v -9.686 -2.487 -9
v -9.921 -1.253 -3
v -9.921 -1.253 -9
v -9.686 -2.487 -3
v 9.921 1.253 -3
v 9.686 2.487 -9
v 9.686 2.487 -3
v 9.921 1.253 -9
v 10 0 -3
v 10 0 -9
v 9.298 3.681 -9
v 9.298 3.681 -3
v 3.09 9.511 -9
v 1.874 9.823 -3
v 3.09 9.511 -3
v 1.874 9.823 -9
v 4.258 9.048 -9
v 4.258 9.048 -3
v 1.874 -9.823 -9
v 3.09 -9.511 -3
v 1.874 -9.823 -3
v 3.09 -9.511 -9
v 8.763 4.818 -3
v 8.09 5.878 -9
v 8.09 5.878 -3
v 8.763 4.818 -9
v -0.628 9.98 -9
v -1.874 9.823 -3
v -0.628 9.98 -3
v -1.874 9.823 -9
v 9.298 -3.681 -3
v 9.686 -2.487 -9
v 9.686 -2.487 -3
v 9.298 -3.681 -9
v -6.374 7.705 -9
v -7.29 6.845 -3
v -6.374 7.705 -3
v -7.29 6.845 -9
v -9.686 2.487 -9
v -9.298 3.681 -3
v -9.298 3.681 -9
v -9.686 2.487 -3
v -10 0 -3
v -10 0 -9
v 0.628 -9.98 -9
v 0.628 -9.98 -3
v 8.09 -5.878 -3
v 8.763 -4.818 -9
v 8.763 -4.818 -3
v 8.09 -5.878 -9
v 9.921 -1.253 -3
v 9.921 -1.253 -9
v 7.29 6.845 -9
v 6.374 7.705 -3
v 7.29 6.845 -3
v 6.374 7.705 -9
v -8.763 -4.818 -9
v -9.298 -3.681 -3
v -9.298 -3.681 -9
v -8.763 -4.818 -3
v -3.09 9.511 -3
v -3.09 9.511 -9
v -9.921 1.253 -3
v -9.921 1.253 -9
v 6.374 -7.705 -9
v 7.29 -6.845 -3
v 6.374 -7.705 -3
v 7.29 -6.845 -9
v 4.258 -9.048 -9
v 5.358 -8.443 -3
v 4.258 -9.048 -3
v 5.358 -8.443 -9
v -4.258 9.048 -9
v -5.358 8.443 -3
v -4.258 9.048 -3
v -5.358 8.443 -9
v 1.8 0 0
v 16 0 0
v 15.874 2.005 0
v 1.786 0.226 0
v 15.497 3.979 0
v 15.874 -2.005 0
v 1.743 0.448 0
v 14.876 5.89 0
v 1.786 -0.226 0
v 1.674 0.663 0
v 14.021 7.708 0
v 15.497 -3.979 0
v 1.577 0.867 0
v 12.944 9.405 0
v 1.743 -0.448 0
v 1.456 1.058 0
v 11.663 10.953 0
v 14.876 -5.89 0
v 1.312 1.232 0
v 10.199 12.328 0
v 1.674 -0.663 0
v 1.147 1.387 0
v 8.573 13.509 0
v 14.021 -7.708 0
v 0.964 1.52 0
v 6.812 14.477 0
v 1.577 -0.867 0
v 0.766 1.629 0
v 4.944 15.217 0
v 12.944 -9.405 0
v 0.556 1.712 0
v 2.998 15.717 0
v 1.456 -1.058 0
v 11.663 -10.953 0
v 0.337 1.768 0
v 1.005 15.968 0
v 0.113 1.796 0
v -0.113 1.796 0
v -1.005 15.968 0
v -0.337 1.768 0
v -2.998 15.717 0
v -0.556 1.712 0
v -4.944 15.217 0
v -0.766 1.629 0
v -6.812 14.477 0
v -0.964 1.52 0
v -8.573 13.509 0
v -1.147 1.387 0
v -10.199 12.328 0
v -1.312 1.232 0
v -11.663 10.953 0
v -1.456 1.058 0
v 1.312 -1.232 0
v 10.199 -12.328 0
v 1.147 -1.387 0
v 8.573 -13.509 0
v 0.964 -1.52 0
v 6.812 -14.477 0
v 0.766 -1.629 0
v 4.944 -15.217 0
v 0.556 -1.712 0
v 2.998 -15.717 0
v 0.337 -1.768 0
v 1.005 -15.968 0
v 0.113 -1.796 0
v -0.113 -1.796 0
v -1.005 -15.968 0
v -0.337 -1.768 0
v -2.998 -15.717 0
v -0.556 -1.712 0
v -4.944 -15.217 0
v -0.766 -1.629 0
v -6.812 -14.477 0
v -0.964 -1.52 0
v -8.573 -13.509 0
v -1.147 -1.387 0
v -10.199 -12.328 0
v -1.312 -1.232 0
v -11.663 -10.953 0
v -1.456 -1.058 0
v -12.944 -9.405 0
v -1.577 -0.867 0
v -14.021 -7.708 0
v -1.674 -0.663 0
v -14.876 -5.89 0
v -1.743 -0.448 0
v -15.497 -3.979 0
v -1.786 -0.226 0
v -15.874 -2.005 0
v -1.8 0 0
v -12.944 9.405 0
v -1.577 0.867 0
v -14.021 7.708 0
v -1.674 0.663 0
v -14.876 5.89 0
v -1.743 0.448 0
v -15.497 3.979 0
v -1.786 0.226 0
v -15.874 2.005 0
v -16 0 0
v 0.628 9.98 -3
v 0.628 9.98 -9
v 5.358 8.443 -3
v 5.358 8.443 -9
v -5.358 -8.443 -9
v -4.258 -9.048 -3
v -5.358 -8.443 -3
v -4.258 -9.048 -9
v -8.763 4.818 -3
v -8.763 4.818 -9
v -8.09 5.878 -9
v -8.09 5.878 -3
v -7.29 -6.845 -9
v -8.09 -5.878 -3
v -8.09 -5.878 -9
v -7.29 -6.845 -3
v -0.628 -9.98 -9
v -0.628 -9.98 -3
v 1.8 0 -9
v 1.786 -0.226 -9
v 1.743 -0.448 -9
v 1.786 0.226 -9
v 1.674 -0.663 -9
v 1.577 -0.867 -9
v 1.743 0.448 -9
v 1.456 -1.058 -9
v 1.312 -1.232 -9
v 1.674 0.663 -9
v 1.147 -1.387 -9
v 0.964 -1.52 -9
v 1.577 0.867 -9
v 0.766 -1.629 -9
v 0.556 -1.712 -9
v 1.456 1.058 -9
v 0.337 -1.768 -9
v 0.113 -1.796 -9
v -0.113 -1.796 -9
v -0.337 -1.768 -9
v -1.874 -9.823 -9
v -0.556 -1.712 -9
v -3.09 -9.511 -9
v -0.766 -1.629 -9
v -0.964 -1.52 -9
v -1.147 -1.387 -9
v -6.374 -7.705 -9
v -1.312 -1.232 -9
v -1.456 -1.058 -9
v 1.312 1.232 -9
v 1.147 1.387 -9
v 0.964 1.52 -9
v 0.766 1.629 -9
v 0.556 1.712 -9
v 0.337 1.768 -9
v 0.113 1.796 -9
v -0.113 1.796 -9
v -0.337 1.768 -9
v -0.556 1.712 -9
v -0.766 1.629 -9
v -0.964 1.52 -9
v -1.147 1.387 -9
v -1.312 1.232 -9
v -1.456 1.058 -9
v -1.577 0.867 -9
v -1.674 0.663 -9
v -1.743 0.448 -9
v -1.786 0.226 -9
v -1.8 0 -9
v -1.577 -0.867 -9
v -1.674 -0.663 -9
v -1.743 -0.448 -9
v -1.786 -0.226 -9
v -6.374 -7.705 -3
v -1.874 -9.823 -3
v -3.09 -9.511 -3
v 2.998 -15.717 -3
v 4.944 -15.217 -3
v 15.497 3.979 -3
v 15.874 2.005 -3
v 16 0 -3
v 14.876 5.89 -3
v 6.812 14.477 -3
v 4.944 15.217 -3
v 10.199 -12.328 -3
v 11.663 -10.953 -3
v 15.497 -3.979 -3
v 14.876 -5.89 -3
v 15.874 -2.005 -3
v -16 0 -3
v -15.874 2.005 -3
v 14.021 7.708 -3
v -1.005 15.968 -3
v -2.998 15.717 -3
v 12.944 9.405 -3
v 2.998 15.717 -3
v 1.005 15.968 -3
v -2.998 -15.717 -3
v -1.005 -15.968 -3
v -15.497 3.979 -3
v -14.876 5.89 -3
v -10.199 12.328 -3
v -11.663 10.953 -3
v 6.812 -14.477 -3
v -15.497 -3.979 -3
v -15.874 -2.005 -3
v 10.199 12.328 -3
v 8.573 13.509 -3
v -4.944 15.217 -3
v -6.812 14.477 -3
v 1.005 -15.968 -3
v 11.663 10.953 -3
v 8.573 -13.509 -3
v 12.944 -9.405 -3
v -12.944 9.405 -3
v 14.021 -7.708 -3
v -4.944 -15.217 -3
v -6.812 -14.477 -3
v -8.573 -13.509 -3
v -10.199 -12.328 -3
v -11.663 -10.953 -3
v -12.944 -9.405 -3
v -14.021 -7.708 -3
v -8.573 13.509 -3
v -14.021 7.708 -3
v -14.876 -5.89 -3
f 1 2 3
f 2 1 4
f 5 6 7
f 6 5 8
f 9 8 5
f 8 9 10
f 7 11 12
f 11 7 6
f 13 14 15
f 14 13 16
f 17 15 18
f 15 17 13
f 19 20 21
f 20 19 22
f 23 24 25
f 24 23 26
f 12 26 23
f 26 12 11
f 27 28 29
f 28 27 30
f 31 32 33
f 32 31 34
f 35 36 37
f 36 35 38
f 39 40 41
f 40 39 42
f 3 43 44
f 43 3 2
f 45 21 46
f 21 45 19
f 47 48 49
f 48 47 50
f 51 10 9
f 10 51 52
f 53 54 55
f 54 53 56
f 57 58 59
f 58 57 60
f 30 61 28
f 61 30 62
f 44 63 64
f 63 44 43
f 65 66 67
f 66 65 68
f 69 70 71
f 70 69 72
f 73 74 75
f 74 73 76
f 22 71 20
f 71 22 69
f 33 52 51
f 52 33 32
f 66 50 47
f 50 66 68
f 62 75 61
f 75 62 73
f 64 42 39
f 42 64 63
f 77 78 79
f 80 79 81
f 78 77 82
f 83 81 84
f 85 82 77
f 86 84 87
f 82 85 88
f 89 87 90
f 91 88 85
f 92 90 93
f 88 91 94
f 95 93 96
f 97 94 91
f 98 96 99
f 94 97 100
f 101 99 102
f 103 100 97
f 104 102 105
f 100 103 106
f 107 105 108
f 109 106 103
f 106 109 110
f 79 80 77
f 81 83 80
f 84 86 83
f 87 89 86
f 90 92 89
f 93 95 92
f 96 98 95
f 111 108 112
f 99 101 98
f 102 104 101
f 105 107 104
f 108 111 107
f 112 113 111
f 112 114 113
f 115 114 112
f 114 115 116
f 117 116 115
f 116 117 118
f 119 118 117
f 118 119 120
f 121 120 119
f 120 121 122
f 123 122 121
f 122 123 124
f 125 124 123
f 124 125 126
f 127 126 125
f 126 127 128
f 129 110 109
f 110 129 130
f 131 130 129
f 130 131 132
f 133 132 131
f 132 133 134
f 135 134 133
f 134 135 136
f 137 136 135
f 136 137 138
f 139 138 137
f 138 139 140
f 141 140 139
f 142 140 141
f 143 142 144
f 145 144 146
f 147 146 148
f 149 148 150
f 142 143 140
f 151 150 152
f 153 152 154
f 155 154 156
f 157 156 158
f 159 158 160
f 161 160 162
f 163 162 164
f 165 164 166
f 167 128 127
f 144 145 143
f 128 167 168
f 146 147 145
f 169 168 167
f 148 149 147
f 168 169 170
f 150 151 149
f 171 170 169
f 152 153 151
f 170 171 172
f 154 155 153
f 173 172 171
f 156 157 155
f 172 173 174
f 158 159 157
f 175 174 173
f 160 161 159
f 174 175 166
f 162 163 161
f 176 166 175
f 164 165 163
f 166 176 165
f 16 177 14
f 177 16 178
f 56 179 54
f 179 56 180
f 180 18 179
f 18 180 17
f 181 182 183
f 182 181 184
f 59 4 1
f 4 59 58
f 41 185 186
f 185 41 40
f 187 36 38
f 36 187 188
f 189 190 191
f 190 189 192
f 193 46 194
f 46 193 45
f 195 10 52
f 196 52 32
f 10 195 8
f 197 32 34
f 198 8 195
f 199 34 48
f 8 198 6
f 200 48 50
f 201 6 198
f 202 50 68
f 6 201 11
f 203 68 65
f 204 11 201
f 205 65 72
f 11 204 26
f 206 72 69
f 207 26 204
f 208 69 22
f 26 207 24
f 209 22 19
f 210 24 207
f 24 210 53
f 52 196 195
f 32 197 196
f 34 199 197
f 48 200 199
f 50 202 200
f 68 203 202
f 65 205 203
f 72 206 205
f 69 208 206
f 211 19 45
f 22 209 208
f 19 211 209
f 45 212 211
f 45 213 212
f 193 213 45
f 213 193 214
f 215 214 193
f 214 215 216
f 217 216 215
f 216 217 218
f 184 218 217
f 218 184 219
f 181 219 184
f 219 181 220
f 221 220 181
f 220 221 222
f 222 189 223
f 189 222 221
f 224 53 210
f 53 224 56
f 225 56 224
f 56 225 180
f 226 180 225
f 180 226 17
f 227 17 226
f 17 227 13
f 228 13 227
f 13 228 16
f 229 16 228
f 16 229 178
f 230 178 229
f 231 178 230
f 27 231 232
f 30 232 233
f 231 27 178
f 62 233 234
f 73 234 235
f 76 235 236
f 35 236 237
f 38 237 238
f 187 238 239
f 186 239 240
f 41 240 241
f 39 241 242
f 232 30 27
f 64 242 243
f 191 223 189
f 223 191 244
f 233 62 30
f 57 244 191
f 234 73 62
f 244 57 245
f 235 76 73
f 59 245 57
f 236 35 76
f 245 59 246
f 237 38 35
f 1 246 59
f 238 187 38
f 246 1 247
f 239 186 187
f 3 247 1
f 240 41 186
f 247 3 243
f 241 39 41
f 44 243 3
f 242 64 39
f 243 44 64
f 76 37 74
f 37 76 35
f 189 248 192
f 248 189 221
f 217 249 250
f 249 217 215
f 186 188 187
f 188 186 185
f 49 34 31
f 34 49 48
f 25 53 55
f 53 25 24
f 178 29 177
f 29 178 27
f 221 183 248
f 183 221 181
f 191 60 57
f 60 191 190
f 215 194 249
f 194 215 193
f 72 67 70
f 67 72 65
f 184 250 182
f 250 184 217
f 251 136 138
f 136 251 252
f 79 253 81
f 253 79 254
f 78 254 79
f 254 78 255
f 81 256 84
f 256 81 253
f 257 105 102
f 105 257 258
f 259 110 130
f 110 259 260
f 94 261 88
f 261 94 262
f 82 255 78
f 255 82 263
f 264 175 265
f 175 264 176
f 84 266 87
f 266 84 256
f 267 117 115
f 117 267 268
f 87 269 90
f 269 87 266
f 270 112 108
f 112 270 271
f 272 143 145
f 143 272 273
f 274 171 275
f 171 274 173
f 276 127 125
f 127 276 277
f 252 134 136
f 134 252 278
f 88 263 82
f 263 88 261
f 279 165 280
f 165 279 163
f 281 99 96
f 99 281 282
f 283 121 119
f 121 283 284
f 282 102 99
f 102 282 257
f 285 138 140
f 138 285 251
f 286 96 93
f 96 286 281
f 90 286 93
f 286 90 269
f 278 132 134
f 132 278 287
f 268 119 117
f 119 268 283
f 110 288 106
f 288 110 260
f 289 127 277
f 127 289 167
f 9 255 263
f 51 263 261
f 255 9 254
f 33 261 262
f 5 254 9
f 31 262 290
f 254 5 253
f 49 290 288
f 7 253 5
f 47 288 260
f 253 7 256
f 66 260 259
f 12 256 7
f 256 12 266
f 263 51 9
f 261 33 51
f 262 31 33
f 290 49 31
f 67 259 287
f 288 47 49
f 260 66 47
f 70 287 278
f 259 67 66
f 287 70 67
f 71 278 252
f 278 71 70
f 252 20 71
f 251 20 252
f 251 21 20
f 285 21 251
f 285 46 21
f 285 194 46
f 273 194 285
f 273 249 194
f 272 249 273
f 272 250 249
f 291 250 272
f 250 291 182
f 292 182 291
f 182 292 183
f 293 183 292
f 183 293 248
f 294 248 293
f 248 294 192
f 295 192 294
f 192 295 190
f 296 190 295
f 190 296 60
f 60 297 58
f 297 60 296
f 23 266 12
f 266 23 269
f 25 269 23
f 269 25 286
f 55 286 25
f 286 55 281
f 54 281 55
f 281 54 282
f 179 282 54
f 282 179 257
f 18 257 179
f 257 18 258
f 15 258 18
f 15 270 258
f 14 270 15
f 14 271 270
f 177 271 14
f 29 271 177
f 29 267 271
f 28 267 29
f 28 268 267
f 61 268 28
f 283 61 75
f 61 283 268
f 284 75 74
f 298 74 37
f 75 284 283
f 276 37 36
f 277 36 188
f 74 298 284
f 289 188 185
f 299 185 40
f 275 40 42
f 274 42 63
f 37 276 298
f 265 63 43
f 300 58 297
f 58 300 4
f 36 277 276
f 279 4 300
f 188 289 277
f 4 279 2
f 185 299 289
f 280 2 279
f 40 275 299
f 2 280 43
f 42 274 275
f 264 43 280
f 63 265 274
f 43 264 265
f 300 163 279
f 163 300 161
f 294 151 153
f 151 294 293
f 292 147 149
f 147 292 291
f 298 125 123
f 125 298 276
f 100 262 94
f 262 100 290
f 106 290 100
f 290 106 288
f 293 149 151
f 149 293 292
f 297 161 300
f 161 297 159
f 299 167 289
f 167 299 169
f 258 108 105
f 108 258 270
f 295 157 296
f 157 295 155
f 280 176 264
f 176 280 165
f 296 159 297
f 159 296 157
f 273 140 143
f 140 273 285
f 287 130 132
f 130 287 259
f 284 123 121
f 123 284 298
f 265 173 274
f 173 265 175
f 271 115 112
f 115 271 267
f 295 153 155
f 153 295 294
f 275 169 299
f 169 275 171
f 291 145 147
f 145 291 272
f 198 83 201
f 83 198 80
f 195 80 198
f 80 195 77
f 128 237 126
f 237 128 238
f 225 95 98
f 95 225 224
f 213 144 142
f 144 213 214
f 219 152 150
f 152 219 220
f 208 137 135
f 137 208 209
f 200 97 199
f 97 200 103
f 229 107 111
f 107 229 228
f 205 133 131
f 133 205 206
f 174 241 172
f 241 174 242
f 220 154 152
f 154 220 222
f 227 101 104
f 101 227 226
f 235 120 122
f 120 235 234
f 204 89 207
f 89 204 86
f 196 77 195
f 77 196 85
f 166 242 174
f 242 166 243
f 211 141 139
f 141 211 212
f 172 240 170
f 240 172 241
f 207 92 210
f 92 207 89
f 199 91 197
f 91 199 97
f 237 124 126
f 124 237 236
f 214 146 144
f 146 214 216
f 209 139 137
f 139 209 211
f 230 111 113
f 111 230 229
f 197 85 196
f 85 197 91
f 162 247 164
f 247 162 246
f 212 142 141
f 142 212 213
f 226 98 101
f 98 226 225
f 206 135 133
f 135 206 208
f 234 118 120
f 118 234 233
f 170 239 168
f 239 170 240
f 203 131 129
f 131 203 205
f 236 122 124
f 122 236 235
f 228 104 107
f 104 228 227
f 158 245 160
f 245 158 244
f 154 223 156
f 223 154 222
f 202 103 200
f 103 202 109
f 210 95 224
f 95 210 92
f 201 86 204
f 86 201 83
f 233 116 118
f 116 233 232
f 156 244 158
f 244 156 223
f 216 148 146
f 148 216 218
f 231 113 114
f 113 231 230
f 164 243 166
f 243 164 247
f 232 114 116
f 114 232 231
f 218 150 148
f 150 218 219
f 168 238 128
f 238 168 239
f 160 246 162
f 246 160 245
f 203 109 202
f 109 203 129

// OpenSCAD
$fn = 50;


difference() {
	union() {
		translate(v = [0, 0, -9.0000000000]) {
			cylinder(h = 9, r = 10.0000000000);
		}
		translate(v = [0, 0, -3.0000000000]) {
			cylinder(h = 3, r = 16.0000000000);
		}
	}
	union() {
		#translate(v = [0, 0, -9]) {
			cylinder(h = 9, r = 1.8000000000);
		}
	}
}
